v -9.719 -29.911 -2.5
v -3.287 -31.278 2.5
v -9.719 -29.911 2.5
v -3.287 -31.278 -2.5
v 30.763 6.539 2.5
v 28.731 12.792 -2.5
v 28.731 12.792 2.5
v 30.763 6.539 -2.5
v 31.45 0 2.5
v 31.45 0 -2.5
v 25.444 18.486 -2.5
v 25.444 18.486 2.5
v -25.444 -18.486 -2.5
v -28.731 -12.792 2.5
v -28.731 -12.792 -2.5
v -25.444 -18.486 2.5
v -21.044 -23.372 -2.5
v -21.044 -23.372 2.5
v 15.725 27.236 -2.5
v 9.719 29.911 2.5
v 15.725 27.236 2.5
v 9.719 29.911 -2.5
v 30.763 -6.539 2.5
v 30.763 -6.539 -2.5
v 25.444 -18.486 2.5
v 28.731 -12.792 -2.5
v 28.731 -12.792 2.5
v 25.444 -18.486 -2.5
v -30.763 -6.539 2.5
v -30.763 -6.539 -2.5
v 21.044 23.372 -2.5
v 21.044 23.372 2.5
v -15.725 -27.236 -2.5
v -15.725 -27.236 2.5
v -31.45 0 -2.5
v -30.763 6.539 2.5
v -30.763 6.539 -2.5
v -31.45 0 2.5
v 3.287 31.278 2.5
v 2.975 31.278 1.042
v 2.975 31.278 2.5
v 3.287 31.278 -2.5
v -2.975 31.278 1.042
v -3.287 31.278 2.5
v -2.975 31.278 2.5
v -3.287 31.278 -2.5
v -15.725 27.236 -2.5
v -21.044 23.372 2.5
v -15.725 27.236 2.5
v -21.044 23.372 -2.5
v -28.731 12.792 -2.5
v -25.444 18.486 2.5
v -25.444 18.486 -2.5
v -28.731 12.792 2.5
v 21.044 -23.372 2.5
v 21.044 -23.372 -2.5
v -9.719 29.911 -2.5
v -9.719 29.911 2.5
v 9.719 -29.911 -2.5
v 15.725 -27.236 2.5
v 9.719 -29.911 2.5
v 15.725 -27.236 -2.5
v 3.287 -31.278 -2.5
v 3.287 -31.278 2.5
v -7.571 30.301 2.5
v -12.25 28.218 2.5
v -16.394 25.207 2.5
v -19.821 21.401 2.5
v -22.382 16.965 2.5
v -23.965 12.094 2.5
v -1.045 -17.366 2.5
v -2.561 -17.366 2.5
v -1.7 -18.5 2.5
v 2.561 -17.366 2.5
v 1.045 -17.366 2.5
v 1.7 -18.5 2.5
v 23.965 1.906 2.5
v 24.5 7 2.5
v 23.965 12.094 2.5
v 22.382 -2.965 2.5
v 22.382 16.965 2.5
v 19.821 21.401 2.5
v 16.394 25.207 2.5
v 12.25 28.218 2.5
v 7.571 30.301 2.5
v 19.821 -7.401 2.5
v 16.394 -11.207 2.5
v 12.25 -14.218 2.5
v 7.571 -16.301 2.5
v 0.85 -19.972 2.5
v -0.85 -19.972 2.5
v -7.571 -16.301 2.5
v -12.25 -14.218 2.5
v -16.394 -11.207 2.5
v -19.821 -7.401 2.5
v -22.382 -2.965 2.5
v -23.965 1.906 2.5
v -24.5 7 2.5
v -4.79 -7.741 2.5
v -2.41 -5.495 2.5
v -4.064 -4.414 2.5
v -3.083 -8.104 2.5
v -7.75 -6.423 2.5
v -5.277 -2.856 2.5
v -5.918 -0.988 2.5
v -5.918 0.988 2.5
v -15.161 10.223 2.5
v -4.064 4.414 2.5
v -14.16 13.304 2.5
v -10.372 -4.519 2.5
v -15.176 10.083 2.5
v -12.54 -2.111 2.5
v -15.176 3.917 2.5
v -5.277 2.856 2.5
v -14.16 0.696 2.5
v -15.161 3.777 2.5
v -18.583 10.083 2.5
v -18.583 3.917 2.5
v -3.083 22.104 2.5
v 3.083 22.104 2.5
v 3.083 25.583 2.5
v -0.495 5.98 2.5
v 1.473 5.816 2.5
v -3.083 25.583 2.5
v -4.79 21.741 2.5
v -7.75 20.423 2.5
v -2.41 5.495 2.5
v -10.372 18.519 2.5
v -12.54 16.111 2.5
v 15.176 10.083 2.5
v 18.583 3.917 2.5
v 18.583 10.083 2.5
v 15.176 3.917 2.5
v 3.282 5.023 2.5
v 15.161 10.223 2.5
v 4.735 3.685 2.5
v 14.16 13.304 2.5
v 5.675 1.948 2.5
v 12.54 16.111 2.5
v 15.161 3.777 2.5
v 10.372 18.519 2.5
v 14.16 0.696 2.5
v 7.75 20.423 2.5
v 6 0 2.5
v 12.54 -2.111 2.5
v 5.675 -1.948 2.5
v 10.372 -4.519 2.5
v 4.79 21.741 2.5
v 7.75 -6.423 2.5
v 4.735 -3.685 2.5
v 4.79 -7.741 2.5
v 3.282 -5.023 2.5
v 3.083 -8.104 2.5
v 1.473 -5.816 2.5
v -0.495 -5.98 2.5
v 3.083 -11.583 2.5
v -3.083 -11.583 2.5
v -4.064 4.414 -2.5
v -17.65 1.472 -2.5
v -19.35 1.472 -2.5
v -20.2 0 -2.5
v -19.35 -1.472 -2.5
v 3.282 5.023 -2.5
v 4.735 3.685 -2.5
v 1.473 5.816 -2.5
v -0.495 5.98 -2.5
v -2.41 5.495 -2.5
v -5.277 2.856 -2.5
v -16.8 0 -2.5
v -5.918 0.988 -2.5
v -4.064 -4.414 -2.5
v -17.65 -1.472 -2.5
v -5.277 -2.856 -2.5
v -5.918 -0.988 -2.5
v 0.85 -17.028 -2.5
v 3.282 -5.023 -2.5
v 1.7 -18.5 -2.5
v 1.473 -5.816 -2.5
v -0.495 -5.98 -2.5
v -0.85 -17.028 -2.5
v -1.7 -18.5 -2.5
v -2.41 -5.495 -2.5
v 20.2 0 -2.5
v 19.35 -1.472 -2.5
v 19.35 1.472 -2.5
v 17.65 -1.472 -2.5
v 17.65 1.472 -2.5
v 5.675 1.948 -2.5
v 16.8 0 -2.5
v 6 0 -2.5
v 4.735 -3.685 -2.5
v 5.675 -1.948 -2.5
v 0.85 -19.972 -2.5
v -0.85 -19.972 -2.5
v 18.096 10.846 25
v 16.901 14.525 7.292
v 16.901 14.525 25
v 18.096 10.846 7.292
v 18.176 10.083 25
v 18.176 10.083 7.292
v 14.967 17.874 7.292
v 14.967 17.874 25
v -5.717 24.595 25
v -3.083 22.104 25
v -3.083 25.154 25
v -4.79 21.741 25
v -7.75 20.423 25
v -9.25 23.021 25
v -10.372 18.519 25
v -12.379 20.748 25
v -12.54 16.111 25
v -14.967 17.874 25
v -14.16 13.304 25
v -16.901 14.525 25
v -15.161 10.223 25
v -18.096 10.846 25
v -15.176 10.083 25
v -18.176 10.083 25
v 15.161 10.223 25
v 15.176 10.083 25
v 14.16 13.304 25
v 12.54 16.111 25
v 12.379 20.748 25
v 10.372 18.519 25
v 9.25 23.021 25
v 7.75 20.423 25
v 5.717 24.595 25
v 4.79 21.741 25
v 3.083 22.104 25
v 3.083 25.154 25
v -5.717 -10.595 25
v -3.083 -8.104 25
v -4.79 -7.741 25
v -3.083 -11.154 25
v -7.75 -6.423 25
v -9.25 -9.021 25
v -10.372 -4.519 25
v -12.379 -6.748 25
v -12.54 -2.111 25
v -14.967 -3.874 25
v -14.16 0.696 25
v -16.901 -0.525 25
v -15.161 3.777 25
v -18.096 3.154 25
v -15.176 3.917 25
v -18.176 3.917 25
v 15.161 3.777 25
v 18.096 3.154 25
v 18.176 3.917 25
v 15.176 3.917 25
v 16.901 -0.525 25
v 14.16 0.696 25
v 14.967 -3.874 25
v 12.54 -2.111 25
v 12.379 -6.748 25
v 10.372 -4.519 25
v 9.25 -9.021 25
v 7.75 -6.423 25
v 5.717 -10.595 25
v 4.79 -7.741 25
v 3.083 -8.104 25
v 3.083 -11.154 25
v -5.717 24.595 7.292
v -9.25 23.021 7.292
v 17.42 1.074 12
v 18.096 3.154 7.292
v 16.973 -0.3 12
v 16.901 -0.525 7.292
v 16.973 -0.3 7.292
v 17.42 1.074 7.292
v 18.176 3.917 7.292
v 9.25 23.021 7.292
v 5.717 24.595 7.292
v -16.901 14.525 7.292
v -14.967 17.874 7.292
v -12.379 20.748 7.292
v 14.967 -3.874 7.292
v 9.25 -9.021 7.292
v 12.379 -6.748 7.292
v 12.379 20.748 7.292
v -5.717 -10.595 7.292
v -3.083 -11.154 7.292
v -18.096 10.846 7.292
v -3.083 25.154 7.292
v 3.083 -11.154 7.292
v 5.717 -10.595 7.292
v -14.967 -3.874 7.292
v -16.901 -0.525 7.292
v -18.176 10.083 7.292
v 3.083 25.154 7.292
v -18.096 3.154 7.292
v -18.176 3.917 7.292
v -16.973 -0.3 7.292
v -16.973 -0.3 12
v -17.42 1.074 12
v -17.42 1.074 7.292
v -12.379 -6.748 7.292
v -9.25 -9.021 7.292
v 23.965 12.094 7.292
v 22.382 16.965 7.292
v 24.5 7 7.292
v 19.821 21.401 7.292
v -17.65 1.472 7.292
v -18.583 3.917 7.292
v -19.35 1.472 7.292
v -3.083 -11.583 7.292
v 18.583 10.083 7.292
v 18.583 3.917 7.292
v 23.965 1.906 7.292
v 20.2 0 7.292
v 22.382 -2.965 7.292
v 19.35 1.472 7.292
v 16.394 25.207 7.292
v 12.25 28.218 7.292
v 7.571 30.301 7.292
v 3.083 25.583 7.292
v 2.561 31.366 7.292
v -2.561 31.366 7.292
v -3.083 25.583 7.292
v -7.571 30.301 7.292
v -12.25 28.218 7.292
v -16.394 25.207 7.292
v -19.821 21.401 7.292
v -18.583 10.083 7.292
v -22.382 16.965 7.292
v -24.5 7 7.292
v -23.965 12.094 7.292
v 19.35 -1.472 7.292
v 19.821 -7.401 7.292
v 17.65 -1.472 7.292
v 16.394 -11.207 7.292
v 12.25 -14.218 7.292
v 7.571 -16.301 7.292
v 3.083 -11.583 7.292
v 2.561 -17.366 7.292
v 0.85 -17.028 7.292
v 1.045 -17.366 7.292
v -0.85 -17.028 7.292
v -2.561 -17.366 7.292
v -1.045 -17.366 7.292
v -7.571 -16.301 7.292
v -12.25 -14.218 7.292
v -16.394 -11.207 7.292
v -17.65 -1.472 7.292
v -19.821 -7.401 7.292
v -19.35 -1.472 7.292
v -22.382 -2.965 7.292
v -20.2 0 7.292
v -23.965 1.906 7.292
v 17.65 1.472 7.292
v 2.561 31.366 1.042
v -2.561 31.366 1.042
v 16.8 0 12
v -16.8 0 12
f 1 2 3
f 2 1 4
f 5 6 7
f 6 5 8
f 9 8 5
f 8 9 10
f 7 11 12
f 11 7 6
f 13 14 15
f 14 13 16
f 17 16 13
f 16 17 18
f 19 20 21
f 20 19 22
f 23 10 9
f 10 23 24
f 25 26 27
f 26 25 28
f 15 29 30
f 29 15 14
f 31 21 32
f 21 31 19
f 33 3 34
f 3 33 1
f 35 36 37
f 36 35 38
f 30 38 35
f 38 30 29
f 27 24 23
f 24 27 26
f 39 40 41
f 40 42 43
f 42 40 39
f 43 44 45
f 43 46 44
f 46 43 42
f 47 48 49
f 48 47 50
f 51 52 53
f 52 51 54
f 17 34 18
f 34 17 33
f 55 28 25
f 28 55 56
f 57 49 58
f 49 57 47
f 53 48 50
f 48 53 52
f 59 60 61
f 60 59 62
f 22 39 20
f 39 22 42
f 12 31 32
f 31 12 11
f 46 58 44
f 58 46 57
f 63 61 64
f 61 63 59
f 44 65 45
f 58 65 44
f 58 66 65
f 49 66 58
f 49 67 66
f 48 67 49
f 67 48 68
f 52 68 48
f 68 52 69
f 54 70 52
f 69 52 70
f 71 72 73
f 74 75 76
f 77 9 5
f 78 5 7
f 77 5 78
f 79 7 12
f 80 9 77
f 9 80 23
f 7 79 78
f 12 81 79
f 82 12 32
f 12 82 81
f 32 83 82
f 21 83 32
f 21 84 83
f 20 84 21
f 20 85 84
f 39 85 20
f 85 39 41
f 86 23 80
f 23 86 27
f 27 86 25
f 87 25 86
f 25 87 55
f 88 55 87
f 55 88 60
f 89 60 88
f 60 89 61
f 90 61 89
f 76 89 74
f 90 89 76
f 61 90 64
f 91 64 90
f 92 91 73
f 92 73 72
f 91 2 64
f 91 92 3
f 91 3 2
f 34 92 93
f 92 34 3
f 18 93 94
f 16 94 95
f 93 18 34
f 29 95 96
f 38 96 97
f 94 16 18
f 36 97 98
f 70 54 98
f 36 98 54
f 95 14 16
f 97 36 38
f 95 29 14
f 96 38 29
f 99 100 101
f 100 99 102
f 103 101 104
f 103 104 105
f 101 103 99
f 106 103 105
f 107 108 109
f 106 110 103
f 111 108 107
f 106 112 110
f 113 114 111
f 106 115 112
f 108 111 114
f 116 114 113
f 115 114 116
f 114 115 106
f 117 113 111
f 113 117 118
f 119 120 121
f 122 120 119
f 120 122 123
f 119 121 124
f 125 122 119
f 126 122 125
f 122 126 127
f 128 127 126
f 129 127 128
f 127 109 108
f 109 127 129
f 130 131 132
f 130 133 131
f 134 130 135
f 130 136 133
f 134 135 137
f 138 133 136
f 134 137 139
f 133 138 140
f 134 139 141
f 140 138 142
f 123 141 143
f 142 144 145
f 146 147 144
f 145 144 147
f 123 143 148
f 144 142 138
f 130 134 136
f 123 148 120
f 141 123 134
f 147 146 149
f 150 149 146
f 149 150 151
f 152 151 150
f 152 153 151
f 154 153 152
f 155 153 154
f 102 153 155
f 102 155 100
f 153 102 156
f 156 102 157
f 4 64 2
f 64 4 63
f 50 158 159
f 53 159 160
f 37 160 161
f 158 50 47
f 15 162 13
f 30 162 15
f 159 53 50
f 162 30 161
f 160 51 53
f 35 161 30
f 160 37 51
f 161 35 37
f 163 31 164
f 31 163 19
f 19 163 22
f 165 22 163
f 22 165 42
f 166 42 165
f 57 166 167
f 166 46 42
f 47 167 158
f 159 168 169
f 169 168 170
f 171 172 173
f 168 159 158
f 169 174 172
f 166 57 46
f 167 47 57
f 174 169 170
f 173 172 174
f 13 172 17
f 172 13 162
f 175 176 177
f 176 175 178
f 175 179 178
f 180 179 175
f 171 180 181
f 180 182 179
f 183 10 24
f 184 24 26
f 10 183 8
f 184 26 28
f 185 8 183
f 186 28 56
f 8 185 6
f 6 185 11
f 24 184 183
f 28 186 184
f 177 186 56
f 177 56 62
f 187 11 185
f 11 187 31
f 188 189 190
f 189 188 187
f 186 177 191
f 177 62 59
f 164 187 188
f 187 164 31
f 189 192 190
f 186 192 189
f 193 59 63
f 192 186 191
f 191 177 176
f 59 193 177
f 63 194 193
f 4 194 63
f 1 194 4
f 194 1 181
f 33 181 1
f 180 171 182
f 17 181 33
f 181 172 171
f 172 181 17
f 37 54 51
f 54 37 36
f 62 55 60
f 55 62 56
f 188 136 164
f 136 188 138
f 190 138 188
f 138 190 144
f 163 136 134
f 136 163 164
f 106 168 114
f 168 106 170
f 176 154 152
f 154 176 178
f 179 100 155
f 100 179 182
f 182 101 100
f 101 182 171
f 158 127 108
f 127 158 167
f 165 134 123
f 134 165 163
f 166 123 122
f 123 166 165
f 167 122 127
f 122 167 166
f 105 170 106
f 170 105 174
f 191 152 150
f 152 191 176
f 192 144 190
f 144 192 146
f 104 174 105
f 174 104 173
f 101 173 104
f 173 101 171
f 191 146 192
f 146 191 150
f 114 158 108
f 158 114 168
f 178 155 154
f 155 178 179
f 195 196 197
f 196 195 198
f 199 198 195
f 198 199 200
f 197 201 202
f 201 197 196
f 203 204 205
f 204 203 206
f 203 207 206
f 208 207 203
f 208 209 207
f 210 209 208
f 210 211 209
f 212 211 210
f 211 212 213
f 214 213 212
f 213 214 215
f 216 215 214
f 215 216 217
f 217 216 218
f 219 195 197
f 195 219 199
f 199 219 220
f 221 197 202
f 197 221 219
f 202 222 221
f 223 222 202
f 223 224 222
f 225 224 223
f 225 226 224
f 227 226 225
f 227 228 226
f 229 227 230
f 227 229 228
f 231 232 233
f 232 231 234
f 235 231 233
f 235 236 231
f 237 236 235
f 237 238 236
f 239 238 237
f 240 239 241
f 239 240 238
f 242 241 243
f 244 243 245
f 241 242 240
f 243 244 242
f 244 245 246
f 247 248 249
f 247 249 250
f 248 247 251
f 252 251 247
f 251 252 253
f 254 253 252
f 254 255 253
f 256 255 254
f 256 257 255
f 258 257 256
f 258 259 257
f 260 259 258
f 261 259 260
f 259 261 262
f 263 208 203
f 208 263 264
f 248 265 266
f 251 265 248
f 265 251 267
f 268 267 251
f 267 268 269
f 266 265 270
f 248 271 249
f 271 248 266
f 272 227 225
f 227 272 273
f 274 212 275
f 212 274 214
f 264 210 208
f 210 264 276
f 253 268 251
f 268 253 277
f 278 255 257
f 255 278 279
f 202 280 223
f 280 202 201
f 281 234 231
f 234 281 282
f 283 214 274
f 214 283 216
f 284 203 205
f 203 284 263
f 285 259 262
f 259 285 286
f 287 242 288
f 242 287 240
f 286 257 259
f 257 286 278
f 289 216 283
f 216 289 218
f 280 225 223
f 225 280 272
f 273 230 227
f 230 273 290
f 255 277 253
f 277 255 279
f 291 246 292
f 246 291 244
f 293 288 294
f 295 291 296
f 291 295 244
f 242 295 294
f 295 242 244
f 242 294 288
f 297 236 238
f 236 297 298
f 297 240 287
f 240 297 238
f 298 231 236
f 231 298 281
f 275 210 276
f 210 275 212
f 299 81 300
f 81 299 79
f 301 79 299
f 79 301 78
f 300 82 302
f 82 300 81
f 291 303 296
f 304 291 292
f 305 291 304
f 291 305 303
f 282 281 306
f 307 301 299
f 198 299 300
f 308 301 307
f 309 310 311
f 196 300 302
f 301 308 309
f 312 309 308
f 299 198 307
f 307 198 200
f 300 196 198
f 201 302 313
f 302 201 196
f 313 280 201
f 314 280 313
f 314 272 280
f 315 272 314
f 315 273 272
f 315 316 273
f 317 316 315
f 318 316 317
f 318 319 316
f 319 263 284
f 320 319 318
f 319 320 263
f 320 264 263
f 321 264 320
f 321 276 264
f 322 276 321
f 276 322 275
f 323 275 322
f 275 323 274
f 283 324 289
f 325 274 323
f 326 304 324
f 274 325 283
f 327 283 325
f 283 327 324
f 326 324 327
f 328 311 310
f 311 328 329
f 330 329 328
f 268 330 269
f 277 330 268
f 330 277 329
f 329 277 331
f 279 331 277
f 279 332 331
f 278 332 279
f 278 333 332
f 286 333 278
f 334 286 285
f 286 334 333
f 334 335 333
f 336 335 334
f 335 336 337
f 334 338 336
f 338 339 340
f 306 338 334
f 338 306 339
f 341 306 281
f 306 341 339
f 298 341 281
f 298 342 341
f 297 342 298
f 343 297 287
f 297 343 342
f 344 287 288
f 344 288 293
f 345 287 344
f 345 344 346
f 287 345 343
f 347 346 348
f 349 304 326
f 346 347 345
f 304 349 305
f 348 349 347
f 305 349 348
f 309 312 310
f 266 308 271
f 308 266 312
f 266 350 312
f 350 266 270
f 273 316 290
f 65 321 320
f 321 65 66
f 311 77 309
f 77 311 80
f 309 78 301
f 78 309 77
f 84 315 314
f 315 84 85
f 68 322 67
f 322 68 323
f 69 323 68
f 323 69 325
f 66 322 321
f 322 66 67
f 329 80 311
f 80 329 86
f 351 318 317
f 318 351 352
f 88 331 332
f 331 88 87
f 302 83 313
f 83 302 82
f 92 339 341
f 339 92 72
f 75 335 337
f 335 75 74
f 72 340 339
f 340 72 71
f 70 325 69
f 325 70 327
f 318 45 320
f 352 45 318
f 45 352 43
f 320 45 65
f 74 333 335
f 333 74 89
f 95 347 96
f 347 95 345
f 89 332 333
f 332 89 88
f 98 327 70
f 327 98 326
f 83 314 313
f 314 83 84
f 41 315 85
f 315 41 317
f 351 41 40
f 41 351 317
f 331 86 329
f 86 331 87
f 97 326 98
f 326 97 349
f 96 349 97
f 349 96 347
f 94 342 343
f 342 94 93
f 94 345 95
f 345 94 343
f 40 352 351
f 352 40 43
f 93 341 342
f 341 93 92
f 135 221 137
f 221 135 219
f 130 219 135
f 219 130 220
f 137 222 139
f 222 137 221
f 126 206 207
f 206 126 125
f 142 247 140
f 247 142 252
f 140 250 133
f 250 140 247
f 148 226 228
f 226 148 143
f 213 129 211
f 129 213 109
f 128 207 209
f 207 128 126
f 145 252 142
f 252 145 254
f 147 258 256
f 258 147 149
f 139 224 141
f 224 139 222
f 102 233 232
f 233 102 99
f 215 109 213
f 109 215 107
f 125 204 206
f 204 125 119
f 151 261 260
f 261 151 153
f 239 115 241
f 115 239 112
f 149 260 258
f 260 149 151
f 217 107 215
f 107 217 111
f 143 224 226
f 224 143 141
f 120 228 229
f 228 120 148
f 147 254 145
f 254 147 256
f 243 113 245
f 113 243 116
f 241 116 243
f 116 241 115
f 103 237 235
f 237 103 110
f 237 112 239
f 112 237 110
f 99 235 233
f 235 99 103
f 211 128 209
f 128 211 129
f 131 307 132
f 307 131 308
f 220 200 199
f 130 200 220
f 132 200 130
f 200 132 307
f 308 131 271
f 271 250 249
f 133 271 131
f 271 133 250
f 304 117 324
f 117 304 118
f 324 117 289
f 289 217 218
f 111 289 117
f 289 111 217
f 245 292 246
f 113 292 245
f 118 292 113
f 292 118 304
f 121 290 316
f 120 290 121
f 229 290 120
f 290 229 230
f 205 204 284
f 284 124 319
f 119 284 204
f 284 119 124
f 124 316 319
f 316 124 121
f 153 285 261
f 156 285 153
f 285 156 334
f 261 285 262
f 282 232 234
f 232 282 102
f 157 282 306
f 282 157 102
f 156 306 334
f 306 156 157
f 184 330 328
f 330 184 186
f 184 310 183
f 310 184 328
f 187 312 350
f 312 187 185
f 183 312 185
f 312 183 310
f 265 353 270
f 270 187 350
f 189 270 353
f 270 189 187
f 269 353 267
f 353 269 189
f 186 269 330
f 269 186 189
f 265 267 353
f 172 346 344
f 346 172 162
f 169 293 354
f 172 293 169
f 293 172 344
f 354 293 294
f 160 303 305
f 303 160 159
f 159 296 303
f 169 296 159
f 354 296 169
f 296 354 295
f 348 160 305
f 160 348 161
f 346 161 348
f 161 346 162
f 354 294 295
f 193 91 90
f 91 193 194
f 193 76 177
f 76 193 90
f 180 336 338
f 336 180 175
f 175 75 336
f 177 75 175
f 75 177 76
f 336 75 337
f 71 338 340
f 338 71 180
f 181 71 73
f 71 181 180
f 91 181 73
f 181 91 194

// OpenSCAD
module mount(outer, length) {
	difference() {
     union() {
		cylinder(r=outer, h=length, center=true);
	    translate([0,0,-length/3])
		cylinder(r=outer+6, h=length/4, center=true);
      }
		cylinder(r=outer-3, h=length+2, center=true);
	    translate([outer-3,0,0])  // X
			cube([outer/3,outer/3,length+2], center=true);

	    translate([-(outer-3),0,0])  // -X
			cube([outer/3,outer/3,length+2], center=true);

	    translate([0,outer-3,0])     // Y
			cube([outer/3,outer/3,length+2], center=true);

	    translate([0,-(outer-3),0])  // -Y
			cube([outer/3,outer/3,length+2], center=true);

    }
}

module hole(x,y,radius) {
	translate([x,y,0])
	cylinder(r=radius,h=24,center=true);
}

module base(outer, inner, height) {
	difference() {
	  cylinder(r=outer, h=height, center=true);
	  cylinder(r=inner, h=height, center=true);
    }
}



motor_radius = 18.5;
long = 25;
shaft = 6;
motor_offset = 7;
offset = 18.5;

difference() {
 union() {
  base(1.7*motor_radius, shaft, 5);
  translate([0,motor_offset,long/2])
	  mount(motor_radius, long);
  }
	hole(offset,0,1.7);
	//  hole(0, offset, 1);
	hole(-offset,0,1.7);
	hole(0,-offset,1.7);
 }
